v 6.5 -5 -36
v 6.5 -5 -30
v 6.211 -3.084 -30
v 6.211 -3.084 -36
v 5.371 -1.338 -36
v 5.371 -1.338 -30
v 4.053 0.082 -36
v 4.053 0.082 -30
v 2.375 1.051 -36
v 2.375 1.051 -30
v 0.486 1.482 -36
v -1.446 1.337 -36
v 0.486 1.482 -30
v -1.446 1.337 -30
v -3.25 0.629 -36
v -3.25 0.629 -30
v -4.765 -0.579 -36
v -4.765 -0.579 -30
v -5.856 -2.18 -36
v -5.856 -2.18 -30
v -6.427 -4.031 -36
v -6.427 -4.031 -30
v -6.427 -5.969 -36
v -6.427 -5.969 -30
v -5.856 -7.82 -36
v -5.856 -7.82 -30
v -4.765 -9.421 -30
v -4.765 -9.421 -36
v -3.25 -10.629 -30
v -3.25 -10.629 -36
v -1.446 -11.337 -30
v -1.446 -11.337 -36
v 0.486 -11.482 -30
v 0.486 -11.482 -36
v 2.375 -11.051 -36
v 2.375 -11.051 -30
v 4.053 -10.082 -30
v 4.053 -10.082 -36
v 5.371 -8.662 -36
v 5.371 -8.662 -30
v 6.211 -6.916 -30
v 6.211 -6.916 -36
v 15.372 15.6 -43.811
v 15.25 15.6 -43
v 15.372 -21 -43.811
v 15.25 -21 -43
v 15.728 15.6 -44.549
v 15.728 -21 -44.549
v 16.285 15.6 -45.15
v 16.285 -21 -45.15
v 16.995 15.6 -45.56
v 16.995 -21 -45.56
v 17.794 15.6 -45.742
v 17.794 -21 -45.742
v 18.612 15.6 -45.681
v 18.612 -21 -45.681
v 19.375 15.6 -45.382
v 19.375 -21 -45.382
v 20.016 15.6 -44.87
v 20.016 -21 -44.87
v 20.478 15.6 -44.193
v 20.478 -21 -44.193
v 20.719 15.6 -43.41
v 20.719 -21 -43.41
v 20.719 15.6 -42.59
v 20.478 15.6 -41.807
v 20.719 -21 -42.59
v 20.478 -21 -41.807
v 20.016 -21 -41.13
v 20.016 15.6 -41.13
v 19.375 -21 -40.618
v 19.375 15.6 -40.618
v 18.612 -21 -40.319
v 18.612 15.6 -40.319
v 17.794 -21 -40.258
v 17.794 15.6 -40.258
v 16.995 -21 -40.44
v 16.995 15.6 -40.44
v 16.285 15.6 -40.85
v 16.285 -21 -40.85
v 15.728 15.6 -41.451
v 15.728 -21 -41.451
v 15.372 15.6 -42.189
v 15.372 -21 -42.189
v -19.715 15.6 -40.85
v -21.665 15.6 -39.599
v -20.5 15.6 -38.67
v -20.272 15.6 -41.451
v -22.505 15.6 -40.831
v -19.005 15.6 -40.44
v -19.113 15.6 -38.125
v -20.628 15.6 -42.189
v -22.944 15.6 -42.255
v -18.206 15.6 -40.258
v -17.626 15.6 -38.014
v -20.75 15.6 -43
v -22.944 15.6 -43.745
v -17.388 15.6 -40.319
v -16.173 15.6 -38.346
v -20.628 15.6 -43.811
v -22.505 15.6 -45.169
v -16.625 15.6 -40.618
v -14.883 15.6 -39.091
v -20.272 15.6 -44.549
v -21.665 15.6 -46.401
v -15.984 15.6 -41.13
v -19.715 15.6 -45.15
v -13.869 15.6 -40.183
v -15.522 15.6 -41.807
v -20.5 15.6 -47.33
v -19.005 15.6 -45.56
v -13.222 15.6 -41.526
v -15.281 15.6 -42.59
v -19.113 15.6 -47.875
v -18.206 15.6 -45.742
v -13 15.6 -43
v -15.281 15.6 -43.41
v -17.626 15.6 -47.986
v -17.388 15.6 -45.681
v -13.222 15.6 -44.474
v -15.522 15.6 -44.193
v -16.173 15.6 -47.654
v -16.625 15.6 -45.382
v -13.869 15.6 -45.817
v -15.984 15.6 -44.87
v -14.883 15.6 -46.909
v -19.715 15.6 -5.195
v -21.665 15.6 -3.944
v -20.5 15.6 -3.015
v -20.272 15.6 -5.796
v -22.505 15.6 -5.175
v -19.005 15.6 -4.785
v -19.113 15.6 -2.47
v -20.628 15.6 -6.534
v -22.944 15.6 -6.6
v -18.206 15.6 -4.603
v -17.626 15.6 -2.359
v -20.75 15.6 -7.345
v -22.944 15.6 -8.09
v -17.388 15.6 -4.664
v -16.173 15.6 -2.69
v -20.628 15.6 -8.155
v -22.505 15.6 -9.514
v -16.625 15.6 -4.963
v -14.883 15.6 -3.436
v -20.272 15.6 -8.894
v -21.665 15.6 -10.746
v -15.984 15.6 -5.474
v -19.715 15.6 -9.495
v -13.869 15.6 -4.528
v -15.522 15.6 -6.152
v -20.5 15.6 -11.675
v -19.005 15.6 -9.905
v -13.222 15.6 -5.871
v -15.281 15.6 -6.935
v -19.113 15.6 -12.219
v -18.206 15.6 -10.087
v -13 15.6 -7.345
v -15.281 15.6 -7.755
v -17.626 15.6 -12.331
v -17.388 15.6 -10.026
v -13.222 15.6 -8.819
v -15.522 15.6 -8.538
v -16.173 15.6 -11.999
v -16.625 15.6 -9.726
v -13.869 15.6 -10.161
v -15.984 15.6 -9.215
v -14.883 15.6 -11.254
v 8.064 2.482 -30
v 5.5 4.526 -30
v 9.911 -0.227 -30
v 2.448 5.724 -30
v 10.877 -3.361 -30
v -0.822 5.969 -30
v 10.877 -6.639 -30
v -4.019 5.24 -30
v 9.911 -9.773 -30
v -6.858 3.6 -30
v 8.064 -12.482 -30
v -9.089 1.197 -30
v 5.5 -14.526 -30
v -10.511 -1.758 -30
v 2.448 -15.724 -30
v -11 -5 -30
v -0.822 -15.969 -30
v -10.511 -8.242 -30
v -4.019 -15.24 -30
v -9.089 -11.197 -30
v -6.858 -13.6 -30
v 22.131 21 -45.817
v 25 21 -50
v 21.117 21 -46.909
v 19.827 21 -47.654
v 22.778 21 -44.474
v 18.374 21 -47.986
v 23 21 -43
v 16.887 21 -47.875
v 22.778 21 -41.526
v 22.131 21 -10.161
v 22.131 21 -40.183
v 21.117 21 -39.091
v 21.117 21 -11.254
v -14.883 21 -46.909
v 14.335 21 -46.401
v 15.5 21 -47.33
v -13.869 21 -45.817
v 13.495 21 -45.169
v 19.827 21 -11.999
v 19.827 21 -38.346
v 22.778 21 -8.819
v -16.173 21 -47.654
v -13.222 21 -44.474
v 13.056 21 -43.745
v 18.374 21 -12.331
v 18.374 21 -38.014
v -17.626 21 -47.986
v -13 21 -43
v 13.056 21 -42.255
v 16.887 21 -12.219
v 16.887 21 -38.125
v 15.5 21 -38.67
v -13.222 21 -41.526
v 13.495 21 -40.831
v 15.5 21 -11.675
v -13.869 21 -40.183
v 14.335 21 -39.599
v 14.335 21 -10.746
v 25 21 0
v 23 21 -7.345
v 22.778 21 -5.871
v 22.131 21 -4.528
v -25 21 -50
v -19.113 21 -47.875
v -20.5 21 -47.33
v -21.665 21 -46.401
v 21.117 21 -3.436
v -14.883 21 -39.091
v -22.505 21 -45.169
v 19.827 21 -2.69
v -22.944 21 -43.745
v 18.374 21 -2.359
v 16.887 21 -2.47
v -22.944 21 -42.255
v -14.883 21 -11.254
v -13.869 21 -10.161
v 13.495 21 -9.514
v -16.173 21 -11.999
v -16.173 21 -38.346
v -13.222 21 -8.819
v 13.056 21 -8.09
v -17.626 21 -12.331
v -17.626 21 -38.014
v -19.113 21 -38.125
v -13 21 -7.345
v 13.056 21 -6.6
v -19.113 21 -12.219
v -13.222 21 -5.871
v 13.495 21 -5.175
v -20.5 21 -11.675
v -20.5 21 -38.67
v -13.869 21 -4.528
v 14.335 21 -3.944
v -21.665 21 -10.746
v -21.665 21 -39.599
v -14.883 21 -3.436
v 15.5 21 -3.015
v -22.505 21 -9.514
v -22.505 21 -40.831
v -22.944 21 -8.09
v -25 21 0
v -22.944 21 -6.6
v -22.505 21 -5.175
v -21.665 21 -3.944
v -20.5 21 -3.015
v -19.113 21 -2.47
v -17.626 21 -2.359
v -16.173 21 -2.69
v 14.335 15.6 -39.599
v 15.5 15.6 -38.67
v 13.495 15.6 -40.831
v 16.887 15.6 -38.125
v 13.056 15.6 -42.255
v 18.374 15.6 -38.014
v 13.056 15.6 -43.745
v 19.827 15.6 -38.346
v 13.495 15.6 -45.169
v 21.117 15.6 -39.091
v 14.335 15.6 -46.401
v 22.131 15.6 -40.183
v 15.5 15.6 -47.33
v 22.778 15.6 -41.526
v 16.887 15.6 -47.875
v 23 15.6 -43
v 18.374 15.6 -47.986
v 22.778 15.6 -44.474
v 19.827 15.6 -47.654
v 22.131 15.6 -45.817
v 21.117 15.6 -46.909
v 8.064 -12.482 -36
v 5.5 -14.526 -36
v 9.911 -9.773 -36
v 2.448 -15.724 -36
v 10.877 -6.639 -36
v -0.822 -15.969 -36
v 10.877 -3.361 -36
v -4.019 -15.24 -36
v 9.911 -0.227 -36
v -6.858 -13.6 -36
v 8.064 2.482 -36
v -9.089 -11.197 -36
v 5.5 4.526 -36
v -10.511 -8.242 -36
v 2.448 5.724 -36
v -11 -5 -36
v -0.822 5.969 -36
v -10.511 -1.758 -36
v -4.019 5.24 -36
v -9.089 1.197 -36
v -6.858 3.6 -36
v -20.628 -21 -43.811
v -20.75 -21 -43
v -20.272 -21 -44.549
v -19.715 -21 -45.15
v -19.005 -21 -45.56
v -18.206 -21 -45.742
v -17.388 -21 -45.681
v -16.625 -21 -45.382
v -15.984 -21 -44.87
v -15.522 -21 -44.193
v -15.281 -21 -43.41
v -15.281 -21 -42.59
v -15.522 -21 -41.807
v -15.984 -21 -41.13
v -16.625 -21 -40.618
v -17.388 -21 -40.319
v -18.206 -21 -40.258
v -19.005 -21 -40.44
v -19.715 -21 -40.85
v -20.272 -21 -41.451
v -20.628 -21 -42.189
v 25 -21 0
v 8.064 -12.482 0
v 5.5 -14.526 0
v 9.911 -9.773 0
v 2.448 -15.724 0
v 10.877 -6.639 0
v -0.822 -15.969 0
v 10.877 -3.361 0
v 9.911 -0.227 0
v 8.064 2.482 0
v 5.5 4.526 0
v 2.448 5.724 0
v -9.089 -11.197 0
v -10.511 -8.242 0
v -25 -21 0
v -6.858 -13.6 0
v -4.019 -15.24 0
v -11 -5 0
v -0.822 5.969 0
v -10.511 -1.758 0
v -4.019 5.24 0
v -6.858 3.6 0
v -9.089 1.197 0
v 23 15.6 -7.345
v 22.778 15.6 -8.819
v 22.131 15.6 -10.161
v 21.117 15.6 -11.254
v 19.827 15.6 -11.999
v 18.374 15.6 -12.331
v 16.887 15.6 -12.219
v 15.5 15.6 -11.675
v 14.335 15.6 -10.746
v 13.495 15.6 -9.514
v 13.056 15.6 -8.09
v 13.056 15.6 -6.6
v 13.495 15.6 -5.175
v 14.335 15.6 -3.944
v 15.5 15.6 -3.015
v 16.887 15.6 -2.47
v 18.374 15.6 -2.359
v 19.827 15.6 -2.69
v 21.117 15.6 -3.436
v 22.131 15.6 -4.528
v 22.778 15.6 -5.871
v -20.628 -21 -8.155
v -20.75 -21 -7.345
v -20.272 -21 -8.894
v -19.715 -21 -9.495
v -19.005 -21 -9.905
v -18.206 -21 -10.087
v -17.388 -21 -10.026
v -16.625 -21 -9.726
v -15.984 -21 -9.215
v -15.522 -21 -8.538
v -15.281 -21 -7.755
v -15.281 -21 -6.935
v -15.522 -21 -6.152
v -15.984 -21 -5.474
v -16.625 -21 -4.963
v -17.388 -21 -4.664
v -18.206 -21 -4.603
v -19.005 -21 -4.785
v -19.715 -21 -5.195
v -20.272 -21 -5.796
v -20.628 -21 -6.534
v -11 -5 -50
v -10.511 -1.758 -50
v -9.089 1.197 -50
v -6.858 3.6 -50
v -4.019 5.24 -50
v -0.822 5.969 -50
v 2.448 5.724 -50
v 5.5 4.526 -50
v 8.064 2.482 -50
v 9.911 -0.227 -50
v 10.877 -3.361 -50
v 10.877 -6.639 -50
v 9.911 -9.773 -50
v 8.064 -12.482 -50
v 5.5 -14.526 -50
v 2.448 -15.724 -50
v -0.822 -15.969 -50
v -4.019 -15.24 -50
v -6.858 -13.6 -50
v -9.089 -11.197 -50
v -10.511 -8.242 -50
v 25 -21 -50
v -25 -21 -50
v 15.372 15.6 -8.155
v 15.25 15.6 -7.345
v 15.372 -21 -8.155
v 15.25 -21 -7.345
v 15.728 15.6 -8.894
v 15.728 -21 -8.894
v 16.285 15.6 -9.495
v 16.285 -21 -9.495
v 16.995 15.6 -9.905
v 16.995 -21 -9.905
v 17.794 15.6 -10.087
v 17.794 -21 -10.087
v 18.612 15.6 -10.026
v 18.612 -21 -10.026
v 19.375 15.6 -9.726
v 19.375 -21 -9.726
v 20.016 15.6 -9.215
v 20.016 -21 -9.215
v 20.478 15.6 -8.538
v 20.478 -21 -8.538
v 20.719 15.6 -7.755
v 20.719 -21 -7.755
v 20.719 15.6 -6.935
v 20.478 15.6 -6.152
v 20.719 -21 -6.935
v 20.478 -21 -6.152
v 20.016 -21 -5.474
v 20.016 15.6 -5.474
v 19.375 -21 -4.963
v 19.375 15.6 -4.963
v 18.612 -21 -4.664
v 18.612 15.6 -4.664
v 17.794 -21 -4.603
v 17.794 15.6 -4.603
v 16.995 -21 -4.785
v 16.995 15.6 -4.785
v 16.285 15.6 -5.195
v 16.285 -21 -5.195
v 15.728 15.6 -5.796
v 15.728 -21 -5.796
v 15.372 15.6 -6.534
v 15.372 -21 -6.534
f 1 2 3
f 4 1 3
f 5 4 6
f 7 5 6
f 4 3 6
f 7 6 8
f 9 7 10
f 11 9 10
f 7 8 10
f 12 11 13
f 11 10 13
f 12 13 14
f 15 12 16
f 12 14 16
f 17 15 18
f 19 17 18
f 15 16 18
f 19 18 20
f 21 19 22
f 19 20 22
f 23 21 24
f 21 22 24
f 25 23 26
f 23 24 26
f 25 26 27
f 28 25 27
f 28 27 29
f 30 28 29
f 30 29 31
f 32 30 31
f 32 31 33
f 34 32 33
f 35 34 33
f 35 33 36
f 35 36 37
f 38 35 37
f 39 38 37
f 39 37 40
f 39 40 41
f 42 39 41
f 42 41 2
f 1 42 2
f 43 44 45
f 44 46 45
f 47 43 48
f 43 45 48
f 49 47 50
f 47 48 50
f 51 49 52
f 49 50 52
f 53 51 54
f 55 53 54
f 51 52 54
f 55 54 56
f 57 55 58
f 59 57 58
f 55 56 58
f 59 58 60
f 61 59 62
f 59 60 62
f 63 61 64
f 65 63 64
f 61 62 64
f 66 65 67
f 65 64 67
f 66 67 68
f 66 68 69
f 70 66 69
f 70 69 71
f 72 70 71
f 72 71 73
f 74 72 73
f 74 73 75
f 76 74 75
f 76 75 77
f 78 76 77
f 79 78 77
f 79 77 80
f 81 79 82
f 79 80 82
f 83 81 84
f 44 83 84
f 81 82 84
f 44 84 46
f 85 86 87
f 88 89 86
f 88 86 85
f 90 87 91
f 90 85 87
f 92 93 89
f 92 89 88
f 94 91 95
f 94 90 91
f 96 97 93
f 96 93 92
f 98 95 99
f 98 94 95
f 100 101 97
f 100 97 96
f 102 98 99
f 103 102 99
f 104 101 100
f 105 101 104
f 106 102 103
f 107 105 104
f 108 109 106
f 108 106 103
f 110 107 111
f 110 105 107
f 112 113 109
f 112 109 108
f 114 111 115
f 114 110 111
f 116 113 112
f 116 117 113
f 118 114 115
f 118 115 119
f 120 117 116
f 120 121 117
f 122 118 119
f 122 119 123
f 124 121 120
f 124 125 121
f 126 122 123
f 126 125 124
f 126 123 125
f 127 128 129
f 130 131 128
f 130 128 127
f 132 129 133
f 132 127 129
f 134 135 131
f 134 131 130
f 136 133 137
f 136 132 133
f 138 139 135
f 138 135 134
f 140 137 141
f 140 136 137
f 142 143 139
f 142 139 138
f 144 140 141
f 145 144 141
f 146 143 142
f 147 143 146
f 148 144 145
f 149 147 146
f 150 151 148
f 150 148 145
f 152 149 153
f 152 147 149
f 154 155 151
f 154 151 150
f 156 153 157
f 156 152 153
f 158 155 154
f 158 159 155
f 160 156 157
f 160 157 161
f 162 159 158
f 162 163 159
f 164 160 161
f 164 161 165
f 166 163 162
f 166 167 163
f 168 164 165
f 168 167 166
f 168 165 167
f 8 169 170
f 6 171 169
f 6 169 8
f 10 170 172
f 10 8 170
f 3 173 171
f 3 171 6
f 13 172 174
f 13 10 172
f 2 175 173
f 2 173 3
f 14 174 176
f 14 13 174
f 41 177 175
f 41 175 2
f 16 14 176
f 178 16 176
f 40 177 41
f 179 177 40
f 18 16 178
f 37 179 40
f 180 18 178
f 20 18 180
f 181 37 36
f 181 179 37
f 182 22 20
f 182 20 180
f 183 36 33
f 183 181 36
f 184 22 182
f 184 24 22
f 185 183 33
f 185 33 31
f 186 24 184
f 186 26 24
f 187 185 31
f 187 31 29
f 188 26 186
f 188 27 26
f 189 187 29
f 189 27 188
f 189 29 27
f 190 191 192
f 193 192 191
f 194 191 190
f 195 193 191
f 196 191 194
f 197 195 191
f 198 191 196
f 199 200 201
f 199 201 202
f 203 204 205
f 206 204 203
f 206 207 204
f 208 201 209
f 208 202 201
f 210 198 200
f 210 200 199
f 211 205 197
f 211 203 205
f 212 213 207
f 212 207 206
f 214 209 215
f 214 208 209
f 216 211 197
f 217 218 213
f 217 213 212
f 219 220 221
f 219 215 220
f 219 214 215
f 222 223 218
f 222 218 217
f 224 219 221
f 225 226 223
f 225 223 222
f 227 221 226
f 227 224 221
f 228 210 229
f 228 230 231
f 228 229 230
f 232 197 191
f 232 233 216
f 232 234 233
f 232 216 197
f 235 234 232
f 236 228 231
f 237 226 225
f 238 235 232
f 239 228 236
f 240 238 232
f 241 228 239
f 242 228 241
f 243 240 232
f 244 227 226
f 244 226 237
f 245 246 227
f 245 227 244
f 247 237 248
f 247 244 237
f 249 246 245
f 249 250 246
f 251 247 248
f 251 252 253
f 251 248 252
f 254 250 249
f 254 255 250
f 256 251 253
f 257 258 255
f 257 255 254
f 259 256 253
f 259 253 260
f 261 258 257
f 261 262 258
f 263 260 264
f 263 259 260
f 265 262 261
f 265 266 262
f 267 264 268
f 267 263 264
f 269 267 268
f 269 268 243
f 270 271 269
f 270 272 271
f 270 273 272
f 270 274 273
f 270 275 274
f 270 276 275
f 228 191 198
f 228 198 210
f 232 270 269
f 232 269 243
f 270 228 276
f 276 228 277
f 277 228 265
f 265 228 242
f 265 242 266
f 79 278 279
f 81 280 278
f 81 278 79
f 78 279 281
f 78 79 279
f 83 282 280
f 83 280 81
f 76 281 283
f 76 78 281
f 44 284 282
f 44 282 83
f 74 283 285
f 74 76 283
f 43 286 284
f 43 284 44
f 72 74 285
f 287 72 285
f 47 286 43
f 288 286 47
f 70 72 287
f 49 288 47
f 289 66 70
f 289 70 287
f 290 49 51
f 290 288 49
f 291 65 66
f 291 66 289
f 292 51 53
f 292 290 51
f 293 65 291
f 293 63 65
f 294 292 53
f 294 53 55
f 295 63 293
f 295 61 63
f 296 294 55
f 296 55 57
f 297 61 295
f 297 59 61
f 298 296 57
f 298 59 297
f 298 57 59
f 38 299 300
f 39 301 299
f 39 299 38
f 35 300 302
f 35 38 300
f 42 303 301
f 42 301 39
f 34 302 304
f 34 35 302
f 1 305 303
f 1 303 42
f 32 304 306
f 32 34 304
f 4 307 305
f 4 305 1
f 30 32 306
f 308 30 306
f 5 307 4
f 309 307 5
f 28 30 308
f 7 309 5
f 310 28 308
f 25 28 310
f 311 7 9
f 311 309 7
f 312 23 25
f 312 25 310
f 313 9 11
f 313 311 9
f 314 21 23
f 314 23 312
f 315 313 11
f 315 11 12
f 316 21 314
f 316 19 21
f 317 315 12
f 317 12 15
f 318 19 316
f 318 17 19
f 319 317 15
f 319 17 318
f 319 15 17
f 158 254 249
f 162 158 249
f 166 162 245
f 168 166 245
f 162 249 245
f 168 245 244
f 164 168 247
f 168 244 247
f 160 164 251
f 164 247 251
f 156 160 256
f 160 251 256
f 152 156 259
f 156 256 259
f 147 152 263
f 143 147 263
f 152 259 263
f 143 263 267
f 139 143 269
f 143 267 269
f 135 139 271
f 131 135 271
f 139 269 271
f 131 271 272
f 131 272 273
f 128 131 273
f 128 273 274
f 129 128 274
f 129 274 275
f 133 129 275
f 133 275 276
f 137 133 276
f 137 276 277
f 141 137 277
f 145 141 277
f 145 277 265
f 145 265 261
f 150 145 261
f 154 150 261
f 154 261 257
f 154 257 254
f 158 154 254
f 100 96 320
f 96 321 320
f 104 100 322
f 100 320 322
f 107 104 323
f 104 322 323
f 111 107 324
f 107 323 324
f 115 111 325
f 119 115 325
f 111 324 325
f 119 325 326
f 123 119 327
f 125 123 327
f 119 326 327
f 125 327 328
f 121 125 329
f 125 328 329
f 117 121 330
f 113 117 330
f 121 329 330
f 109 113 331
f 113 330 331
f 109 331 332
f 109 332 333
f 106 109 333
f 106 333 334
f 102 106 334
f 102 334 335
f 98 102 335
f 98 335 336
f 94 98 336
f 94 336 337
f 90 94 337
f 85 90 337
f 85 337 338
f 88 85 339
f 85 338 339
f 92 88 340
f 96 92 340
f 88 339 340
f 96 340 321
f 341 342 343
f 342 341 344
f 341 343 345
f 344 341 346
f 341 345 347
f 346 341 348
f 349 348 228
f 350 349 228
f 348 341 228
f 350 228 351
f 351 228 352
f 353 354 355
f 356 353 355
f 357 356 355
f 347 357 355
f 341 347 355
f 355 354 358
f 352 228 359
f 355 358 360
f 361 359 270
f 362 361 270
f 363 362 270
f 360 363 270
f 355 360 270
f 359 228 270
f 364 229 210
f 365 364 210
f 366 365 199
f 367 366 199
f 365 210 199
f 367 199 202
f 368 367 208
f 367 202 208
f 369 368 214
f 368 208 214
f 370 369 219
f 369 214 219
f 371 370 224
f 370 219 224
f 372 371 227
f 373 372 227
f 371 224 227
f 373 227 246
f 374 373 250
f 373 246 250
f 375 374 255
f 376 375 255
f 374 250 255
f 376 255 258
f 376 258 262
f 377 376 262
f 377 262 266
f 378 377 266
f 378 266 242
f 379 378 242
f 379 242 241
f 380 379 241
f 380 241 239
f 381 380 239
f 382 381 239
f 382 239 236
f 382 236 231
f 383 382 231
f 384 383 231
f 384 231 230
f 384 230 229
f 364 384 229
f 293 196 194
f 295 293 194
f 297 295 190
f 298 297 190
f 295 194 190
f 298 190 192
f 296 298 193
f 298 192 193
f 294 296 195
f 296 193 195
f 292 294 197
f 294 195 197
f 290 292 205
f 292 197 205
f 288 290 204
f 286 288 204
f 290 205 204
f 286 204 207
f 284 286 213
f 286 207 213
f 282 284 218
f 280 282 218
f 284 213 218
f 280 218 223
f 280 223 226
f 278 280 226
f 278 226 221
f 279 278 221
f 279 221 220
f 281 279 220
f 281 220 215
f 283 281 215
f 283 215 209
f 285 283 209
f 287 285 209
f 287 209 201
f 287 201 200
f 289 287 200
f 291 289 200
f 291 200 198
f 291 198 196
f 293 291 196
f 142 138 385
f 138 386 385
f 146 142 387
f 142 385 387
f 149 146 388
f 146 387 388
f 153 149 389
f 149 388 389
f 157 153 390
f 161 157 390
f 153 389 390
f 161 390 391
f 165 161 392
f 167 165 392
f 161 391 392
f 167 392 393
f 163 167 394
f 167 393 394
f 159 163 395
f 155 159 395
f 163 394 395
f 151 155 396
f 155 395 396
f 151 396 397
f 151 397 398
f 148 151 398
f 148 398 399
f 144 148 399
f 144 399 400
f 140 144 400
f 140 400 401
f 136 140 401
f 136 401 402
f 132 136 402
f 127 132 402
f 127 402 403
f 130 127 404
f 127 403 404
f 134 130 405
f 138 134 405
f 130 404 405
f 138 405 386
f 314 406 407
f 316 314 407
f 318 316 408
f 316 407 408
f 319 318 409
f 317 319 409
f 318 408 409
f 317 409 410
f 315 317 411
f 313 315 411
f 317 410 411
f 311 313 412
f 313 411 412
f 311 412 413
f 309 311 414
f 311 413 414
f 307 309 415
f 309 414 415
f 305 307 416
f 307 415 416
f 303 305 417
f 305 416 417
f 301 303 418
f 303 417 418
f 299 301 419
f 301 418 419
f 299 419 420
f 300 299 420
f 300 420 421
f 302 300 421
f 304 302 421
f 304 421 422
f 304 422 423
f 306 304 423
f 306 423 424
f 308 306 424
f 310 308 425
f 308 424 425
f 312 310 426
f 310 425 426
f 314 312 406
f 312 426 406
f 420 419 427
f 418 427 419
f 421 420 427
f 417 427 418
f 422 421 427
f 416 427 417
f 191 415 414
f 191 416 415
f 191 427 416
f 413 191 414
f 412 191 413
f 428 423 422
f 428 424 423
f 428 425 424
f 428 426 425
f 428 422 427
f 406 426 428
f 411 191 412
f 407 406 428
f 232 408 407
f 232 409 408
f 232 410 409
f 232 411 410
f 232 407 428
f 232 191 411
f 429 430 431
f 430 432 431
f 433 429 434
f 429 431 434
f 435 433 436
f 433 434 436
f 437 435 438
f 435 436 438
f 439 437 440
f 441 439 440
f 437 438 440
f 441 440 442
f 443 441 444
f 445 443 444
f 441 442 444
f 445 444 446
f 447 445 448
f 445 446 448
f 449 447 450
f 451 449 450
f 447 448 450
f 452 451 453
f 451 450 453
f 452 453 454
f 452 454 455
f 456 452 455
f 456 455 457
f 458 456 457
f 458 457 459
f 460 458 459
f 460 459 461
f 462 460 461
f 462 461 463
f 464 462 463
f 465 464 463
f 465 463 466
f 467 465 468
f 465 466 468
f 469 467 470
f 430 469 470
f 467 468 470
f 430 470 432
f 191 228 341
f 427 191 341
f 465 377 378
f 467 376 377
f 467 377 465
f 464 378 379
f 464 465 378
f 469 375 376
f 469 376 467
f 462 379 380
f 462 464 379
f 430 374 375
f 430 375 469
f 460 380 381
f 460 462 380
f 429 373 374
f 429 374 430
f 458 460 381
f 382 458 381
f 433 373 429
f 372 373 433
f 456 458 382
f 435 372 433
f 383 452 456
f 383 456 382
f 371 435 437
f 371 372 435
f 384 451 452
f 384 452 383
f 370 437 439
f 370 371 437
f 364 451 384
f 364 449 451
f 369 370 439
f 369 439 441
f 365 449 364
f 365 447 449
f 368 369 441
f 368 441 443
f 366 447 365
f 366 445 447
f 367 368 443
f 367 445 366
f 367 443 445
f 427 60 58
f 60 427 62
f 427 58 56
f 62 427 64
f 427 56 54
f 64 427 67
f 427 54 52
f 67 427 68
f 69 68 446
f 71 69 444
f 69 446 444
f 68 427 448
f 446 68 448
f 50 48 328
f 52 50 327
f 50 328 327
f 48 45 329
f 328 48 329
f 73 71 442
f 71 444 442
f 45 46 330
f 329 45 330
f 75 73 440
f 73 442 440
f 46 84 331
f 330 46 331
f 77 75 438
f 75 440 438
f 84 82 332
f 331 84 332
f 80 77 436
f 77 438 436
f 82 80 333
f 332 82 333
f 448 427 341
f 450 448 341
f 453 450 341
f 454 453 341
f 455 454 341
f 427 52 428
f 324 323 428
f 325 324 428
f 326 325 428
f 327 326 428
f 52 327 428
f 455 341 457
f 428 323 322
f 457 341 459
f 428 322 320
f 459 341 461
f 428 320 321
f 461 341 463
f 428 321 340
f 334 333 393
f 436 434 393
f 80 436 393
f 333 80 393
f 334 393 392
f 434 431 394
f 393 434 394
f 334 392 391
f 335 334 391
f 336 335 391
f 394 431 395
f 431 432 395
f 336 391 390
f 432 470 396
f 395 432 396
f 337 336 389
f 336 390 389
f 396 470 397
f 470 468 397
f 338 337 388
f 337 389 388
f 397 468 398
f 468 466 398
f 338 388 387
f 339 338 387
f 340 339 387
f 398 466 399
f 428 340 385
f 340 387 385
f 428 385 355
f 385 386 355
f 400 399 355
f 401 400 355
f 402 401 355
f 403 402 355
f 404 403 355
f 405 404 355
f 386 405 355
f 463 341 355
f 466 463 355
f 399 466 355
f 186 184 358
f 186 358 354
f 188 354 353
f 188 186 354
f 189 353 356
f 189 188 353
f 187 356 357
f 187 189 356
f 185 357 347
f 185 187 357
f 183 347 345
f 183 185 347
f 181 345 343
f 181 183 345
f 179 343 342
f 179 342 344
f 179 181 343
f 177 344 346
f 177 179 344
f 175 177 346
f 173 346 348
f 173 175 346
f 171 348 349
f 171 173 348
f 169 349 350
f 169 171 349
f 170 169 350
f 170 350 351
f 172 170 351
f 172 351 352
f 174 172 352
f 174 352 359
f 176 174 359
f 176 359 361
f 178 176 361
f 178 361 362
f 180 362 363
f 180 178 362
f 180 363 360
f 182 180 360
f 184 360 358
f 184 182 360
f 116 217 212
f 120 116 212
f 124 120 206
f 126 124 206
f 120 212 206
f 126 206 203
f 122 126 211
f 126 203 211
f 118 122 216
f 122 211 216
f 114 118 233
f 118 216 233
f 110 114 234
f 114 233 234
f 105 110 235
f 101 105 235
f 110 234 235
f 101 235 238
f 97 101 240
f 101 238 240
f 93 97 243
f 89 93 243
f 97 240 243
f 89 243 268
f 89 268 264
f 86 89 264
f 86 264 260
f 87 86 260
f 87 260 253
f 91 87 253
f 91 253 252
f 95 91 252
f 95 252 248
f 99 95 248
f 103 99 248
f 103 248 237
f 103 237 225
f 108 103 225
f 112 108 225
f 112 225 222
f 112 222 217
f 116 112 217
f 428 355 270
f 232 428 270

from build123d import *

# Parameters (mm, degrees)
EXTRUDE_608_DEPTH          = 50
SKETCH_2_R                 = 11
CUT_EXTRUDE_1_DEPTH        = 14
CUT_EXTRUDE_START          = -30
SKETCH_3_R                 = 11
CUT_EXTRUDE_2_DEPTH        = 30
SKETCH_4_R                 = 6.5
CUT_EXTRUDE_3_DEPTH        = 60.715994507
HOLE_WIZARD_M5_D           = 5.5
HOLE_WIZARD_M5_CBORE_D     = 10
HOLE_WIZARD_M5_CBORE_DEPTH = 5.4


with BuildPart() as part:
    # Эскиз1 → Extrude 608 (new body)
    with BuildSketch(Plane.XY):
        Polygon((-25, 21), (0, 21), (25, 21), (25, -21), (-25, -21), align=None)
    extrude(amount=-EXTRUDE_608_DEPTH)

    # Эскиз2 → Вырез-Вытянуть1 (cut)
    with BuildSketch(Plane(origin=(0, 0, -50), x_dir=(-1, 0, 0), z_dir=(0, 0, -1))):
        with Locations((0, -5)):
            Circle(SKETCH_2_R)
    extrude(amount=-CUT_EXTRUDE_1_DEPTH, mode=Mode.SUBTRACT)

    # Эскиз3 → Вырез-Вытянуть2 (cut)
    with BuildSketch(Plane.XY.offset(CUT_EXTRUDE_START)):
        with Locations(Location((0, -5, 0), (0, 0, 180))):
            Circle(SKETCH_3_R)
    extrude(amount=CUT_EXTRUDE_2_DEPTH, mode=Mode.SUBTRACT)

    # Эскиз4 → Вырез-Вытянуть3 (cut, through all)
    with BuildSketch(Plane.XY):
        with Locations((0, -5)):
            Circle(SKETCH_4_R)
    extrude(amount=-CUT_EXTRUDE_3_DEPTH, mode=Mode.SUBTRACT)

    # Крепление M5 (through all)
    with Locations(Plane(origin=(0, 21, 0), x_dir=(1, 0, 0), z_dir=(0, 1, 0))):
        with Locations((-18, 43), (-18, 7.344841497), (18, 7.344841497), (18, 43)):
            CounterBoreHole(HOLE_WIZARD_M5_D / 2, HOLE_WIZARD_M5_CBORE_D / 2, HOLE_WIZARD_M5_CBORE_DEPTH)


solid = part.part
